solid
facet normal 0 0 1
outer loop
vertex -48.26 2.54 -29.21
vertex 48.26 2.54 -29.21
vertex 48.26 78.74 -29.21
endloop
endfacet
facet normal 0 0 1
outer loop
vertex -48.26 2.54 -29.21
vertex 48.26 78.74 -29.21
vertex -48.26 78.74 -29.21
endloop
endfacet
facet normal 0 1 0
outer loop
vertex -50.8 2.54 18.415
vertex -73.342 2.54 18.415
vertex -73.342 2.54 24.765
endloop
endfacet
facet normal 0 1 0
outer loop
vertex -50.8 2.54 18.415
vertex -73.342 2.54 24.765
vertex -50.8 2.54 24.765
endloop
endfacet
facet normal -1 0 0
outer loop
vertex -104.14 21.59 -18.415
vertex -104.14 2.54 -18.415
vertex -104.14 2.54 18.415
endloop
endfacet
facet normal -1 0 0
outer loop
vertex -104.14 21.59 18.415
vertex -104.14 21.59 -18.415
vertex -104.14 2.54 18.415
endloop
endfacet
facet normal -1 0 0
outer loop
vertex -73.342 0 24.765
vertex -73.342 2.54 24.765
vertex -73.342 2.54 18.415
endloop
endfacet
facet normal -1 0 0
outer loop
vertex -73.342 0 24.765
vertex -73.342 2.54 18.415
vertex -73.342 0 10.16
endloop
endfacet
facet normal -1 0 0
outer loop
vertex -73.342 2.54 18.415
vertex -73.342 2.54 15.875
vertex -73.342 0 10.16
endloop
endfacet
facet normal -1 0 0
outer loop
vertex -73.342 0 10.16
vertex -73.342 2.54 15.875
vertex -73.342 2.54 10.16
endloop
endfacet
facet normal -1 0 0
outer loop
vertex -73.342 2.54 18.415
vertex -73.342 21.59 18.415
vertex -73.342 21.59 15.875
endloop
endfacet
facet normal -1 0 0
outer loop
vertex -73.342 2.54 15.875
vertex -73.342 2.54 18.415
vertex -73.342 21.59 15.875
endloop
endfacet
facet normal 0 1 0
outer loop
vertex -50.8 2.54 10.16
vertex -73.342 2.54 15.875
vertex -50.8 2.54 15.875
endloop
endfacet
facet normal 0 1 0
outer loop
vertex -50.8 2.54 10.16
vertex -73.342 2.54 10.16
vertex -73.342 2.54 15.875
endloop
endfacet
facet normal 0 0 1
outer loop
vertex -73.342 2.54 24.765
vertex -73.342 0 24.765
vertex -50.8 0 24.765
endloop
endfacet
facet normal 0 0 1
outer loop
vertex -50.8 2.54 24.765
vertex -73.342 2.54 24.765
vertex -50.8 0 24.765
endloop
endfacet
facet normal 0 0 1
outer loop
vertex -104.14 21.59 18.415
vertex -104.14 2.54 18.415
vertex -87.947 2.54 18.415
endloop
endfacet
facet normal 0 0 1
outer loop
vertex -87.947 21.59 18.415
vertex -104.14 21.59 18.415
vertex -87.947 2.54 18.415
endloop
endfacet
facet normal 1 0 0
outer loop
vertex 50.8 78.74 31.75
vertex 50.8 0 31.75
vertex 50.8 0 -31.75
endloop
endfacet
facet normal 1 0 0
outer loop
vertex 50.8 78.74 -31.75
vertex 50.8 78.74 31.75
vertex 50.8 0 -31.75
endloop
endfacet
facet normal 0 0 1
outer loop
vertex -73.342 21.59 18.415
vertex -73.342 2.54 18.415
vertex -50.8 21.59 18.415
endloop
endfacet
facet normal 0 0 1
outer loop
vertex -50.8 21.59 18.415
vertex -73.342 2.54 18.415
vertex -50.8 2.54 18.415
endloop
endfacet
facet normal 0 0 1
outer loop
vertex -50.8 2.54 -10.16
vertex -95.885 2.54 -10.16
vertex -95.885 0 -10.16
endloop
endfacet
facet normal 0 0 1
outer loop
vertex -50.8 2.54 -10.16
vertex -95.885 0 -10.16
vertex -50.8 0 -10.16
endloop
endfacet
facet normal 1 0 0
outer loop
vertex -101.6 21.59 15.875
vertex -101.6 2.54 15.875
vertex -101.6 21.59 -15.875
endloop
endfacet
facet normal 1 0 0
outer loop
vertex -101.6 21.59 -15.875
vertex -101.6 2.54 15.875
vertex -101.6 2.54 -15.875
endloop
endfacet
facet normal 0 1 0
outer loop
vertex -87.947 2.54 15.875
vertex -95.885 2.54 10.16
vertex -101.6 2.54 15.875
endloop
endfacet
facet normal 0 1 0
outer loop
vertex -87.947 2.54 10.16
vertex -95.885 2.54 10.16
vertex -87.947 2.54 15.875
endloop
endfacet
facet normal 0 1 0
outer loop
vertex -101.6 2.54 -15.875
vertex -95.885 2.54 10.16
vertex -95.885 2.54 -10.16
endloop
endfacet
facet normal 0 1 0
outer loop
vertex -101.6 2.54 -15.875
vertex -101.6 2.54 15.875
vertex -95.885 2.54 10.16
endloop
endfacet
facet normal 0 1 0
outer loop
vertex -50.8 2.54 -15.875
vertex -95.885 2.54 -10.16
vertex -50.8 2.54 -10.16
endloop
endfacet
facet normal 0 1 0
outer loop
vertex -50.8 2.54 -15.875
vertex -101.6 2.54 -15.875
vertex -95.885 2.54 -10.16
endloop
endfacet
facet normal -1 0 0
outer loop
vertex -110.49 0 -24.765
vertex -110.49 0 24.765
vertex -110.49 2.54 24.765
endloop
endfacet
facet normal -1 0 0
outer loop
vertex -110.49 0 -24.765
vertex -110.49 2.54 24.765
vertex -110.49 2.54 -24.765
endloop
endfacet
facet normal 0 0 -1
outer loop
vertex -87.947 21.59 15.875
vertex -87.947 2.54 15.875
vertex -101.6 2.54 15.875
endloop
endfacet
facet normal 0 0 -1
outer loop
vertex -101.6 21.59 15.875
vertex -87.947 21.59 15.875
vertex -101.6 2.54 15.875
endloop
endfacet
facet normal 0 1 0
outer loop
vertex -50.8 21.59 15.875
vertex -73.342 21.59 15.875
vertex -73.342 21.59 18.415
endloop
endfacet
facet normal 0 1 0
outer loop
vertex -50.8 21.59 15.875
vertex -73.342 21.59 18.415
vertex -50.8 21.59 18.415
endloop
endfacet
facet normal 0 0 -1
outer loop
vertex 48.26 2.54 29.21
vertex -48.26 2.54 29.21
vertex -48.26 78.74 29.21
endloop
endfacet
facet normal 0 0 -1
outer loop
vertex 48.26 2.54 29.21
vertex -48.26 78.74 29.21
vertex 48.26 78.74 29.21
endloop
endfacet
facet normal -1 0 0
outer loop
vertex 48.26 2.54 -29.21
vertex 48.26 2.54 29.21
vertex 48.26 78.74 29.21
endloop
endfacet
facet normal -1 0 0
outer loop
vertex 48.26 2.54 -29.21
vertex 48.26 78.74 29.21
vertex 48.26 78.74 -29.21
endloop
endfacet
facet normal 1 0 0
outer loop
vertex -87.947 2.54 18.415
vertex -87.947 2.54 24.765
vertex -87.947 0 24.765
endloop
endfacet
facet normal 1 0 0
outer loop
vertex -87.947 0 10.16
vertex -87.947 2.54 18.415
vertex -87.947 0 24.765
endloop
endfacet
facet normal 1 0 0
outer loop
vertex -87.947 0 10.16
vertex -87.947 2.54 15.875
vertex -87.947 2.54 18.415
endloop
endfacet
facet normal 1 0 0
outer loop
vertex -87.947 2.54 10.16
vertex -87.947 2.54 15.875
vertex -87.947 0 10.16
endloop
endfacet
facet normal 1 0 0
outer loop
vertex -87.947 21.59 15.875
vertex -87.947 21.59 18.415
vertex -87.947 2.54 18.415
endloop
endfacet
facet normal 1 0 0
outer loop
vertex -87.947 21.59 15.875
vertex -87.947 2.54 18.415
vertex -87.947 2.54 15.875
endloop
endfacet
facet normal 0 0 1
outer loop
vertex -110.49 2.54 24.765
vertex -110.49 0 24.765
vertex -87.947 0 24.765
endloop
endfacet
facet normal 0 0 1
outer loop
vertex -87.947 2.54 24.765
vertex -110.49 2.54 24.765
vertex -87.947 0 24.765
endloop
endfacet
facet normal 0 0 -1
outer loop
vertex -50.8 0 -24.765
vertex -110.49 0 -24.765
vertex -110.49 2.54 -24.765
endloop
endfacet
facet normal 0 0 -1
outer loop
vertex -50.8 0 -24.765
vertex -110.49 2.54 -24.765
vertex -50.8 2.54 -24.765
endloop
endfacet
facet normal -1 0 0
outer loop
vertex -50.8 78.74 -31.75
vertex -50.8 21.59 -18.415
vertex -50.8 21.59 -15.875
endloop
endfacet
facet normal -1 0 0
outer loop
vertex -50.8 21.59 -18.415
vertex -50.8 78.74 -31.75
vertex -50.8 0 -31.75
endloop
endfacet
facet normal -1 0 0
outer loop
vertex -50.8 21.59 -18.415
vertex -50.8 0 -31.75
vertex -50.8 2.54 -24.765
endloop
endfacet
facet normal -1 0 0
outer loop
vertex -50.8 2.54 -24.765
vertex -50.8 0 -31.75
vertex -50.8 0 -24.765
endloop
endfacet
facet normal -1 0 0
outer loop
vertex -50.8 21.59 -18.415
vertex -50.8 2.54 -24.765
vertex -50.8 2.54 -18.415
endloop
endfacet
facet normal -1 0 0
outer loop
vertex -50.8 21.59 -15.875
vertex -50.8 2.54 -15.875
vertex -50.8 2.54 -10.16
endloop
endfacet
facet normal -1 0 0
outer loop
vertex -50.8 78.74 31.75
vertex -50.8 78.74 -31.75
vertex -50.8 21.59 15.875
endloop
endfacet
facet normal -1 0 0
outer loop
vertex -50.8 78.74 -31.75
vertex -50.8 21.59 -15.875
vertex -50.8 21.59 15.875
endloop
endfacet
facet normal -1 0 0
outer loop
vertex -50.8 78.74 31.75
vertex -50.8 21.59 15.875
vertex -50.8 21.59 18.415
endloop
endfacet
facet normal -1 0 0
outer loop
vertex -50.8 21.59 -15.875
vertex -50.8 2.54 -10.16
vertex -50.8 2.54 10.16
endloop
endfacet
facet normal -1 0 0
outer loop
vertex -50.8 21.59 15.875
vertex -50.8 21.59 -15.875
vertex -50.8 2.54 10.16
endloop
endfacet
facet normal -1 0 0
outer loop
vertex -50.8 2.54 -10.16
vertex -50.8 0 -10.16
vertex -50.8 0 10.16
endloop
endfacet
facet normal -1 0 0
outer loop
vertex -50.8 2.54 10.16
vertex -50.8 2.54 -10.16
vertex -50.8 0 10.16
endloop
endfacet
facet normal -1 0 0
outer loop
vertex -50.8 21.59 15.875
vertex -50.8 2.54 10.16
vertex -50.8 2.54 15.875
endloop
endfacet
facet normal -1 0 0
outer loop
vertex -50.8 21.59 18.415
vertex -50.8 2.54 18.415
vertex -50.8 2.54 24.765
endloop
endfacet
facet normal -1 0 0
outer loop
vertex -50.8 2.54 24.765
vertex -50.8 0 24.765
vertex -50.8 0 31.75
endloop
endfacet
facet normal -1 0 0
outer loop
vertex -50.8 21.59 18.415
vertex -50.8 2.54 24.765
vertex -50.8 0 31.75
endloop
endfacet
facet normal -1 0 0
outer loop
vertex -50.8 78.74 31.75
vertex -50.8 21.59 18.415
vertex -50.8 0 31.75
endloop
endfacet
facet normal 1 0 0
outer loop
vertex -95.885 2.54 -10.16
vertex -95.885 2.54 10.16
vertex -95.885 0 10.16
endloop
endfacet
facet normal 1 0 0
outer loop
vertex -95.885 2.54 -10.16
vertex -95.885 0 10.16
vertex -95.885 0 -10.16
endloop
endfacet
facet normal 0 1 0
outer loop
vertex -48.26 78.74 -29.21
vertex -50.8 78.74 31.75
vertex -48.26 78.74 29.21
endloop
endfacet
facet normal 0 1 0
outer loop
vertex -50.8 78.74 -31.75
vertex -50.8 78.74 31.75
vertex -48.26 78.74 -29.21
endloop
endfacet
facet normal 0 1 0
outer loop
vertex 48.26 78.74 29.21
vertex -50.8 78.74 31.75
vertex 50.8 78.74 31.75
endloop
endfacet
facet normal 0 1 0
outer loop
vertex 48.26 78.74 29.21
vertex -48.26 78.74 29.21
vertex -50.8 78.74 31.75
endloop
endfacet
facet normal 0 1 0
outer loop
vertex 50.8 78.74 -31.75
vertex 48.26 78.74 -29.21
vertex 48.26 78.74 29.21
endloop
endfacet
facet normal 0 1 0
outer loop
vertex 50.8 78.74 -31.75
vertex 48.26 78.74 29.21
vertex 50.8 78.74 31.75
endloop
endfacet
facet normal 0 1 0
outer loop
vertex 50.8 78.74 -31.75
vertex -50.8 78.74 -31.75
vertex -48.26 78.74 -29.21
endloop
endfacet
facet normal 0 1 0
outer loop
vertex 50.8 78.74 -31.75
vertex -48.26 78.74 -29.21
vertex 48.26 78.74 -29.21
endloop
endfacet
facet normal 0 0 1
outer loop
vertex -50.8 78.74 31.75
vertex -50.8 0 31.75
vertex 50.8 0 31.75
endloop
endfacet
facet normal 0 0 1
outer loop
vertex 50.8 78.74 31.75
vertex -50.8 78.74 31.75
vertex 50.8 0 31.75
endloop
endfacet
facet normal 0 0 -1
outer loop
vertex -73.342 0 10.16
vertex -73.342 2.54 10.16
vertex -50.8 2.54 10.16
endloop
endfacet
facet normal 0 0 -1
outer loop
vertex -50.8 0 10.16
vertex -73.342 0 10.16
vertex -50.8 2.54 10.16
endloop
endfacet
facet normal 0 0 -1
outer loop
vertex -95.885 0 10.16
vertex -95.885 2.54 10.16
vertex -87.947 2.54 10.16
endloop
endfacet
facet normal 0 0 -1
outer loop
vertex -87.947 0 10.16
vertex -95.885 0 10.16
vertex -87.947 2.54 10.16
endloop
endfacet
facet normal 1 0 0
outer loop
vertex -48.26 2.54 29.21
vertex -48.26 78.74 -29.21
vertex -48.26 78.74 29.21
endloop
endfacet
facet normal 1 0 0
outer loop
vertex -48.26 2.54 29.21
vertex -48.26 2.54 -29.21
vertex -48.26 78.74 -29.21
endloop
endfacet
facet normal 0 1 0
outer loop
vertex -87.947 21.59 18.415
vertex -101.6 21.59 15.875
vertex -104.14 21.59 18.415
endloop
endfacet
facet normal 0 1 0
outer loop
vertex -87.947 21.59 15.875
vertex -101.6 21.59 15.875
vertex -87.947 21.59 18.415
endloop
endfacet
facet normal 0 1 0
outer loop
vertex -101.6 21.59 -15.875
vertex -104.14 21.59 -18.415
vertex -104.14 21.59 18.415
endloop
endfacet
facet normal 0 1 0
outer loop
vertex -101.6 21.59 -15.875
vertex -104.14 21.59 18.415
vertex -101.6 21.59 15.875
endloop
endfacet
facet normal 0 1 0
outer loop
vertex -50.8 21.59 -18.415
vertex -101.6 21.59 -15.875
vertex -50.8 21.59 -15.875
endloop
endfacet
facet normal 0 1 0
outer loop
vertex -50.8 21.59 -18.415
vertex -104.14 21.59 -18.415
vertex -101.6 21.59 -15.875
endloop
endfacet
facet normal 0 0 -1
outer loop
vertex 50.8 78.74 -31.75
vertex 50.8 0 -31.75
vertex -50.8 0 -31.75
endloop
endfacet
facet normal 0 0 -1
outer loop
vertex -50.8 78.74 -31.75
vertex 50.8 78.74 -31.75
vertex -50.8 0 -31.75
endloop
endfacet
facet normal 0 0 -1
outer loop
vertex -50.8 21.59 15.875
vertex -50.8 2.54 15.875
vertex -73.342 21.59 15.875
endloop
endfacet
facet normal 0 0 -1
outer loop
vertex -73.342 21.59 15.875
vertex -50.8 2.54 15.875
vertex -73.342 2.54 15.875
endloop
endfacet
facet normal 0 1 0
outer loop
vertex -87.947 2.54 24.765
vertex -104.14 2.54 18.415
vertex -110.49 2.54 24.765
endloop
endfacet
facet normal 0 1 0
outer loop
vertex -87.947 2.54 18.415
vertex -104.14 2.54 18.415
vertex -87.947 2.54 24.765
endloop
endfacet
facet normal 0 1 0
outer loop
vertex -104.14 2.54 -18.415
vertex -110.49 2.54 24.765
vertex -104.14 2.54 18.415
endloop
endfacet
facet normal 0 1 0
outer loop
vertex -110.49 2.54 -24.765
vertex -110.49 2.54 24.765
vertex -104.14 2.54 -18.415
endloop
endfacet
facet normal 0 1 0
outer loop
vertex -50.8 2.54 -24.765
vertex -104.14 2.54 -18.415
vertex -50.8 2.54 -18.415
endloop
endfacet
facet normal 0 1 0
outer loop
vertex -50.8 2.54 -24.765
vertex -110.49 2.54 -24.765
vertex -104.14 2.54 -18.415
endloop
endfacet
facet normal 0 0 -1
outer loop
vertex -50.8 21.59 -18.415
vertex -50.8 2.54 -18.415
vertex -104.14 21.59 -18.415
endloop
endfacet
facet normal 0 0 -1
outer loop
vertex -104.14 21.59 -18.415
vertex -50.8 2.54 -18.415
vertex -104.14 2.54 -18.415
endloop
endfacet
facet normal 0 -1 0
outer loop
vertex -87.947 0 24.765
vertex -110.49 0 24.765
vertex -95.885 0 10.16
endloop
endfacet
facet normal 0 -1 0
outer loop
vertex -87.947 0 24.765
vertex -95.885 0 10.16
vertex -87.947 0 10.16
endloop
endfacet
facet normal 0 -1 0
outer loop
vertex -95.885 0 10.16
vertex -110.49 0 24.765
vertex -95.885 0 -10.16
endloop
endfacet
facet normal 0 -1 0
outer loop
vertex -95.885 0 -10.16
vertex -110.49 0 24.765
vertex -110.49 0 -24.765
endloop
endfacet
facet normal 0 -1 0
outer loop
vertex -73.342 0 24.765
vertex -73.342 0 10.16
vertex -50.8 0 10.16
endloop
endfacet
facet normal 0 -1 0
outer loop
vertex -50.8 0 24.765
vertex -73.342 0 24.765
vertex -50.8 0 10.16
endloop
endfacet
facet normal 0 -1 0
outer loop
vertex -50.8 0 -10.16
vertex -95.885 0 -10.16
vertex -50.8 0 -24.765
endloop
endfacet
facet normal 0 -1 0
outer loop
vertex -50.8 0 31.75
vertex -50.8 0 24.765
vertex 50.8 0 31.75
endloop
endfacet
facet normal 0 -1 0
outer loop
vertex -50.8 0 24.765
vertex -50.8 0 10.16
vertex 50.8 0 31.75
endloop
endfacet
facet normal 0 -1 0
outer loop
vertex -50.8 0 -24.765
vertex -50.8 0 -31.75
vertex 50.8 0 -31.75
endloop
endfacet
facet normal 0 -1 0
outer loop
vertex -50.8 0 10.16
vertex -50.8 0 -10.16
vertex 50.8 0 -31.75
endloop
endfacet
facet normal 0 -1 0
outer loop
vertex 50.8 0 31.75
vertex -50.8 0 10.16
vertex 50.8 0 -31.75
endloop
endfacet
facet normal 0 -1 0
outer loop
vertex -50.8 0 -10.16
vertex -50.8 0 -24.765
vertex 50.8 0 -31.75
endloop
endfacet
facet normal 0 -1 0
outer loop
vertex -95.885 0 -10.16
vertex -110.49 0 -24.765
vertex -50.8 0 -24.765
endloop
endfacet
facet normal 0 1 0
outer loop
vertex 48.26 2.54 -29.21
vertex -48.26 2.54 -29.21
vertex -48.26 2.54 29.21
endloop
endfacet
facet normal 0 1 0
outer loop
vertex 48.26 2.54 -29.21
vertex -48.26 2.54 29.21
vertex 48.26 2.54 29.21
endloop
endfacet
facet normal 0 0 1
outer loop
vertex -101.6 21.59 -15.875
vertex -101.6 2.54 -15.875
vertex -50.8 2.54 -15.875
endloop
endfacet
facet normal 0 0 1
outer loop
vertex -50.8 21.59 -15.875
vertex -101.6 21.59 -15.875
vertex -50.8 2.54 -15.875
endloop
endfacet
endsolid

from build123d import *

# Parameters (mm, degrees)
BOSS_EXTRUDE1_DEPTH = 78.74
SHELL3_T            = -2.54
SKETCH1_3_W         = 59.69
SKETCH1_3_H         = 49.53
BOSS_EXTRUDE2_DEPTH = 2.54
BOSS_EXTRUDE3_DEPTH = 19.05
SKETCH3_W           = 45.085
SKETCH3_H           = 20.32
CUT_EXTRUDE1_DEPTH  = 3.54
SKETCH4_W           = 14.605
SKETCH4_H           = 14.605
CUT_EXTRUDE2_DEPTH  = 22.59


with BuildPart() as part:
    # Sketch1 → Boss-Extrude1 (new body)
    with BuildSketch(Plane(origin=(0, 0, 0), x_dir=(1, 0, 0), z_dir=(0, 1, 0))):
        Polygon((-50.8, 24.765), (-50.8, -24.765), (-50.8, -31.75), (50.8, -31.75), (50.8, 31.75), (-50.8, 31.75), align=None)
    extrude(amount=BOSS_EXTRUDE1_DEPTH)

    # Shell3
    shell3_openings = [part.faces().sort_by_distance(p)[0] for p in [
        (0, 78.74, 0),
    ]]
    offset(amount=SHELL3_T, openings=shell3_openings, kind=Kind.INTERSECTION)

    # Sketch1_3 → Boss-Extrude2 (add)
    with BuildSketch(Plane(origin=(0, 0, 0), x_dir=(1, 0, 0), z_dir=(0, 1, 0))):
        with Locations((-80.645, 0)):
            Rectangle(SKETCH1_3_W, SKETCH1_3_H)
    extrude(amount=BOSS_EXTRUDE2_DEPTH)

    # Sketch2 → Boss-Extrude3 (add)
    with BuildSketch(Plane(origin=(0, 2.54, 0), x_dir=(1, 0, 0), z_dir=(0, 1, 0))):
        Polygon((-50.8, 15.875), (-50.8, 18.415), (-104.14, 18.415), (-104.14, -18.415), (-50.8, -18.415), (-50.8, -15.875), (-101.6, -15.875), (-101.6, 15.875), align=None)
    extrude(amount=BOSS_EXTRUDE3_DEPTH)

    # Sketch3 → Cut-Extrude1 (cut, through all)
    with BuildSketch(Plane(origin=(0, 2.54, 0), x_dir=(1, 0, 0), z_dir=(0, 1, 0))):
        with Locations((-73.3425, 0)):
            Rectangle(SKETCH3_W, SKETCH3_H)
    extrude(amount=-CUT_EXTRUDE1_DEPTH, mode=Mode.SUBTRACT)

    # Sketch4 → Cut-Extrude2 (cut, through all)
    with BuildSketch(Plane(origin=(0, 21.59, 0), x_dir=(1, 0, 0), z_dir=(0, 1, 0))):
        with Locations((-80.645, -17.4625)):
            Rectangle(SKETCH4_W, SKETCH4_H)
    extrude(amount=-CUT_EXTRUDE2_DEPTH, mode=Mode.SUBTRACT)


solid = part.part
